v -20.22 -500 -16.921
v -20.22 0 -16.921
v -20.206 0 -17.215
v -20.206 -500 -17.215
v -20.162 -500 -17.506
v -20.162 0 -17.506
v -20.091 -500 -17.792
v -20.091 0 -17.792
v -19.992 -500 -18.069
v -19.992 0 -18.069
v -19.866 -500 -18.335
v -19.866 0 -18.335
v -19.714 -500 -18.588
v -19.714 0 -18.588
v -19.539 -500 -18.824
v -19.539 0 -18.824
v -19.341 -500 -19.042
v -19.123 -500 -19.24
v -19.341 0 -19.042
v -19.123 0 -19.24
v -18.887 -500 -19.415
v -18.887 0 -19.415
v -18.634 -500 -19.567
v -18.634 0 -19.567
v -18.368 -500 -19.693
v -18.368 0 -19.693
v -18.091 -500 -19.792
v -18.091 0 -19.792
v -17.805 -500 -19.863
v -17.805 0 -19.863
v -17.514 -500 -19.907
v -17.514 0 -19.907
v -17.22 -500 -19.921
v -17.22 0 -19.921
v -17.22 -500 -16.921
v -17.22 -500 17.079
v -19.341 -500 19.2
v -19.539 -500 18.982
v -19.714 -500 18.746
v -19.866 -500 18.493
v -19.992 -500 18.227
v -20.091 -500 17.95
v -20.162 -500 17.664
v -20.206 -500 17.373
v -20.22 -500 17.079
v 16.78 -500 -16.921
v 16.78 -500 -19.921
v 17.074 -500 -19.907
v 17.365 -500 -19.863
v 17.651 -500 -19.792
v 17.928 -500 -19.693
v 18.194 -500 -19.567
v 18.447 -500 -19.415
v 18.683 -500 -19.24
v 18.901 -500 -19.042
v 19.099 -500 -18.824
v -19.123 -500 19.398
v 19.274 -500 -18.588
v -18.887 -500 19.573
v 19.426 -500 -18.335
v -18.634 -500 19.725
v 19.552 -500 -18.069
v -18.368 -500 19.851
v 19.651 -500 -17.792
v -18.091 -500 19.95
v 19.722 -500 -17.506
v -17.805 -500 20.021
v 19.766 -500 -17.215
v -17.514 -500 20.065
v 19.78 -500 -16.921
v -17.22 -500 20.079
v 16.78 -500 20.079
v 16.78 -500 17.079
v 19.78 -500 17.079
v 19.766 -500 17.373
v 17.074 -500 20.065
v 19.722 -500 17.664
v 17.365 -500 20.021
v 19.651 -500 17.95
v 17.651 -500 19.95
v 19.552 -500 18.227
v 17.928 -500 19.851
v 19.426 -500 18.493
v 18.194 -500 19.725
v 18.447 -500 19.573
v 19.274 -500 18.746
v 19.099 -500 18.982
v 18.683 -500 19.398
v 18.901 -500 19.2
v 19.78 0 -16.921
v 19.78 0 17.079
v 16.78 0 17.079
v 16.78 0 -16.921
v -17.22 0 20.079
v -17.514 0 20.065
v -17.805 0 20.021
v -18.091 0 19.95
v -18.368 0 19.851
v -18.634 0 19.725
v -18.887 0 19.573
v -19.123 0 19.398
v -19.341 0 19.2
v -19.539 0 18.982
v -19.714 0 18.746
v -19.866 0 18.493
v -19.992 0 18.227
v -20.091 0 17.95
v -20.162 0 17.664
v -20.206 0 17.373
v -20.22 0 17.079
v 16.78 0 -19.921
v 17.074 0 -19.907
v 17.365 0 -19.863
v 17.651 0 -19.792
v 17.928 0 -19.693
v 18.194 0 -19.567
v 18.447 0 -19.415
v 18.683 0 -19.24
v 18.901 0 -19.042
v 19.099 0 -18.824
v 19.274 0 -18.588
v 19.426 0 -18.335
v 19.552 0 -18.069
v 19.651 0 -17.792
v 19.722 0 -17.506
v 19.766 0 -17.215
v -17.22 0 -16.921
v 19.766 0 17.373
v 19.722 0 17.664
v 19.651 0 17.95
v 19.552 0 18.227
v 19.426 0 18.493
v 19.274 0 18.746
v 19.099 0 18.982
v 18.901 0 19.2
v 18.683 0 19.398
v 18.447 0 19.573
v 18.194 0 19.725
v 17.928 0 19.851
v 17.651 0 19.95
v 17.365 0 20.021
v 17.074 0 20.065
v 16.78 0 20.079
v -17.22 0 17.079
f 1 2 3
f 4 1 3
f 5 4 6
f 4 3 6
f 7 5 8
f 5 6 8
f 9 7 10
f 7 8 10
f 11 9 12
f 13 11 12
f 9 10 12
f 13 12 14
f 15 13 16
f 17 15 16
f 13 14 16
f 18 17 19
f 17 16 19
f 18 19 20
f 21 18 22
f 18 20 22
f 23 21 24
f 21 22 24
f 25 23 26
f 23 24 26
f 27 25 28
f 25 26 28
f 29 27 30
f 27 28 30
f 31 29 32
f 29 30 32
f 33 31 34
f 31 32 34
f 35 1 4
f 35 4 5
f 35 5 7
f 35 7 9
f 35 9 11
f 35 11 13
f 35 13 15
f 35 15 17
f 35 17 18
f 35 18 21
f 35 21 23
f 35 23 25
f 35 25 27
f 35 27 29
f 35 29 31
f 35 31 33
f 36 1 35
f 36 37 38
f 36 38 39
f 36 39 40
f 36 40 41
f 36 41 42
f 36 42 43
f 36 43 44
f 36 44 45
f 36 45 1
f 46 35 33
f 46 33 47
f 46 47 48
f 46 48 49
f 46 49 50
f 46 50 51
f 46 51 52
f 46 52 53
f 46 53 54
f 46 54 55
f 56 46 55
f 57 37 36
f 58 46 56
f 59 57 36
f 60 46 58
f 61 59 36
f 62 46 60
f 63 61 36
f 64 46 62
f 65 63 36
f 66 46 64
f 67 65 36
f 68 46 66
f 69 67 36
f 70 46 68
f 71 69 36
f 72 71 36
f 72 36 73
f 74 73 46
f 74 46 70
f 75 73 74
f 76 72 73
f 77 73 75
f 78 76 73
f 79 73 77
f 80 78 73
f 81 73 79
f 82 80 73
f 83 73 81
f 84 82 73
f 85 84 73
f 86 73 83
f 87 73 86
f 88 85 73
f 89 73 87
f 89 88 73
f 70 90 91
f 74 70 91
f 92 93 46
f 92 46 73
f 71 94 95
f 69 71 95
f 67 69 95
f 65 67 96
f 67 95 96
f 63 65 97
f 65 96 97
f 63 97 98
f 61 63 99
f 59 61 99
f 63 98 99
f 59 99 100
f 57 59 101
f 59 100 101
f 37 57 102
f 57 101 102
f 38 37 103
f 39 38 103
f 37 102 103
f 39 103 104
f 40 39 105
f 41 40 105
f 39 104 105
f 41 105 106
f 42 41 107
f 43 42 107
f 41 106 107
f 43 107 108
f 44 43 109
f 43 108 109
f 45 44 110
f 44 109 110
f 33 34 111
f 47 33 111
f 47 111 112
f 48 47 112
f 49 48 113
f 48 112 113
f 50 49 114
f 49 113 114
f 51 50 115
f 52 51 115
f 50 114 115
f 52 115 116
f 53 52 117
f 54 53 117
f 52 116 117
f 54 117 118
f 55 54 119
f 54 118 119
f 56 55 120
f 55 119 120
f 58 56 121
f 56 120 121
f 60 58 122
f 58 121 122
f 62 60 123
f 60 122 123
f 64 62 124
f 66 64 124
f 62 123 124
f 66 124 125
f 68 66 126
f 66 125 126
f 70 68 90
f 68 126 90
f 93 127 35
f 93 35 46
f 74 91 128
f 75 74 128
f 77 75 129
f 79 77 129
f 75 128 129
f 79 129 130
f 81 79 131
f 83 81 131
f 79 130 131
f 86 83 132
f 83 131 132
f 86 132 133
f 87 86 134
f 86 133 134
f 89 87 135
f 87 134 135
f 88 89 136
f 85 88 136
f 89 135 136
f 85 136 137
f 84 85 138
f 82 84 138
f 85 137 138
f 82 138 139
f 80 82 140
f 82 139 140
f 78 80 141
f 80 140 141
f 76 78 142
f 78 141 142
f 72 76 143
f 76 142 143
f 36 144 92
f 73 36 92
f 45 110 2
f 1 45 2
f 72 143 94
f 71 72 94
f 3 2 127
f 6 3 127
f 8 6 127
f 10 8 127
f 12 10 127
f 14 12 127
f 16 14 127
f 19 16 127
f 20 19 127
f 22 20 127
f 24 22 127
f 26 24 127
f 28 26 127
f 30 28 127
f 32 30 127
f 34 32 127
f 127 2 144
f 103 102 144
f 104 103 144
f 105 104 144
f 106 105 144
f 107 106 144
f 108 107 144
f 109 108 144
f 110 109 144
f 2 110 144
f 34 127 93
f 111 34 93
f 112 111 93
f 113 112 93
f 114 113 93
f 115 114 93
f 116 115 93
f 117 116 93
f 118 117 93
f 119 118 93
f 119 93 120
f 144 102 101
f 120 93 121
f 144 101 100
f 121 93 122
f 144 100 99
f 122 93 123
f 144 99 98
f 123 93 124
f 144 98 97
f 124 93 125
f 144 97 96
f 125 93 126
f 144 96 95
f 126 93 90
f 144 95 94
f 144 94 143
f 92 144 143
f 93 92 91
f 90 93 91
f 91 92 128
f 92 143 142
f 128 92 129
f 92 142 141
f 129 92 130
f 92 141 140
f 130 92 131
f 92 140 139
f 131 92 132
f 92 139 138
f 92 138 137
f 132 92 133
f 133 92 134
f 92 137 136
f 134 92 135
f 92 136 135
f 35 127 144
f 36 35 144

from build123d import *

# Parameters (mm, degrees)
F0_W     = 34
F0_H     = 34
F1_DEPTH = 500


with BuildPart() as f1:
    # F0 (on Front) → F1 (new body)
    with BuildSketch(Plane.XZ):
        with BuildLine():
            ThreePointArc((19.779984, 17.078975), (18.901304, 19.200296), (16.779984, 20.078975))
            Line((16.779984, 20.078975), (-17.220016, 20.078975))
            ThreePointArc((-17.220016, 20.078975), (-19.341336, 19.200296), (-20.220016, 17.078975))
            Line((-20.220016, 17.078975), (-20.220016, -16.921025))
            ThreePointArc((-20.220016, -16.921025), (-19.341336, -19.042345), (-17.220016, -19.921025))
            Line((-17.220016, -19.921025), (16.779984, -19.921025))
            ThreePointArc((16.779984, -19.921025), (18.901304, -19.042345), (19.779984, -16.921025))
            Line((19.779984, -16.921025), (19.779984, 17.078975))
        make_face()
        with Locations((-0.220016, 0.078975)):
            Rectangle(F0_W, F0_H, mode=Mode.SUBTRACT)
    extrude(amount=F1_DEPTH)


solid = f1.part
